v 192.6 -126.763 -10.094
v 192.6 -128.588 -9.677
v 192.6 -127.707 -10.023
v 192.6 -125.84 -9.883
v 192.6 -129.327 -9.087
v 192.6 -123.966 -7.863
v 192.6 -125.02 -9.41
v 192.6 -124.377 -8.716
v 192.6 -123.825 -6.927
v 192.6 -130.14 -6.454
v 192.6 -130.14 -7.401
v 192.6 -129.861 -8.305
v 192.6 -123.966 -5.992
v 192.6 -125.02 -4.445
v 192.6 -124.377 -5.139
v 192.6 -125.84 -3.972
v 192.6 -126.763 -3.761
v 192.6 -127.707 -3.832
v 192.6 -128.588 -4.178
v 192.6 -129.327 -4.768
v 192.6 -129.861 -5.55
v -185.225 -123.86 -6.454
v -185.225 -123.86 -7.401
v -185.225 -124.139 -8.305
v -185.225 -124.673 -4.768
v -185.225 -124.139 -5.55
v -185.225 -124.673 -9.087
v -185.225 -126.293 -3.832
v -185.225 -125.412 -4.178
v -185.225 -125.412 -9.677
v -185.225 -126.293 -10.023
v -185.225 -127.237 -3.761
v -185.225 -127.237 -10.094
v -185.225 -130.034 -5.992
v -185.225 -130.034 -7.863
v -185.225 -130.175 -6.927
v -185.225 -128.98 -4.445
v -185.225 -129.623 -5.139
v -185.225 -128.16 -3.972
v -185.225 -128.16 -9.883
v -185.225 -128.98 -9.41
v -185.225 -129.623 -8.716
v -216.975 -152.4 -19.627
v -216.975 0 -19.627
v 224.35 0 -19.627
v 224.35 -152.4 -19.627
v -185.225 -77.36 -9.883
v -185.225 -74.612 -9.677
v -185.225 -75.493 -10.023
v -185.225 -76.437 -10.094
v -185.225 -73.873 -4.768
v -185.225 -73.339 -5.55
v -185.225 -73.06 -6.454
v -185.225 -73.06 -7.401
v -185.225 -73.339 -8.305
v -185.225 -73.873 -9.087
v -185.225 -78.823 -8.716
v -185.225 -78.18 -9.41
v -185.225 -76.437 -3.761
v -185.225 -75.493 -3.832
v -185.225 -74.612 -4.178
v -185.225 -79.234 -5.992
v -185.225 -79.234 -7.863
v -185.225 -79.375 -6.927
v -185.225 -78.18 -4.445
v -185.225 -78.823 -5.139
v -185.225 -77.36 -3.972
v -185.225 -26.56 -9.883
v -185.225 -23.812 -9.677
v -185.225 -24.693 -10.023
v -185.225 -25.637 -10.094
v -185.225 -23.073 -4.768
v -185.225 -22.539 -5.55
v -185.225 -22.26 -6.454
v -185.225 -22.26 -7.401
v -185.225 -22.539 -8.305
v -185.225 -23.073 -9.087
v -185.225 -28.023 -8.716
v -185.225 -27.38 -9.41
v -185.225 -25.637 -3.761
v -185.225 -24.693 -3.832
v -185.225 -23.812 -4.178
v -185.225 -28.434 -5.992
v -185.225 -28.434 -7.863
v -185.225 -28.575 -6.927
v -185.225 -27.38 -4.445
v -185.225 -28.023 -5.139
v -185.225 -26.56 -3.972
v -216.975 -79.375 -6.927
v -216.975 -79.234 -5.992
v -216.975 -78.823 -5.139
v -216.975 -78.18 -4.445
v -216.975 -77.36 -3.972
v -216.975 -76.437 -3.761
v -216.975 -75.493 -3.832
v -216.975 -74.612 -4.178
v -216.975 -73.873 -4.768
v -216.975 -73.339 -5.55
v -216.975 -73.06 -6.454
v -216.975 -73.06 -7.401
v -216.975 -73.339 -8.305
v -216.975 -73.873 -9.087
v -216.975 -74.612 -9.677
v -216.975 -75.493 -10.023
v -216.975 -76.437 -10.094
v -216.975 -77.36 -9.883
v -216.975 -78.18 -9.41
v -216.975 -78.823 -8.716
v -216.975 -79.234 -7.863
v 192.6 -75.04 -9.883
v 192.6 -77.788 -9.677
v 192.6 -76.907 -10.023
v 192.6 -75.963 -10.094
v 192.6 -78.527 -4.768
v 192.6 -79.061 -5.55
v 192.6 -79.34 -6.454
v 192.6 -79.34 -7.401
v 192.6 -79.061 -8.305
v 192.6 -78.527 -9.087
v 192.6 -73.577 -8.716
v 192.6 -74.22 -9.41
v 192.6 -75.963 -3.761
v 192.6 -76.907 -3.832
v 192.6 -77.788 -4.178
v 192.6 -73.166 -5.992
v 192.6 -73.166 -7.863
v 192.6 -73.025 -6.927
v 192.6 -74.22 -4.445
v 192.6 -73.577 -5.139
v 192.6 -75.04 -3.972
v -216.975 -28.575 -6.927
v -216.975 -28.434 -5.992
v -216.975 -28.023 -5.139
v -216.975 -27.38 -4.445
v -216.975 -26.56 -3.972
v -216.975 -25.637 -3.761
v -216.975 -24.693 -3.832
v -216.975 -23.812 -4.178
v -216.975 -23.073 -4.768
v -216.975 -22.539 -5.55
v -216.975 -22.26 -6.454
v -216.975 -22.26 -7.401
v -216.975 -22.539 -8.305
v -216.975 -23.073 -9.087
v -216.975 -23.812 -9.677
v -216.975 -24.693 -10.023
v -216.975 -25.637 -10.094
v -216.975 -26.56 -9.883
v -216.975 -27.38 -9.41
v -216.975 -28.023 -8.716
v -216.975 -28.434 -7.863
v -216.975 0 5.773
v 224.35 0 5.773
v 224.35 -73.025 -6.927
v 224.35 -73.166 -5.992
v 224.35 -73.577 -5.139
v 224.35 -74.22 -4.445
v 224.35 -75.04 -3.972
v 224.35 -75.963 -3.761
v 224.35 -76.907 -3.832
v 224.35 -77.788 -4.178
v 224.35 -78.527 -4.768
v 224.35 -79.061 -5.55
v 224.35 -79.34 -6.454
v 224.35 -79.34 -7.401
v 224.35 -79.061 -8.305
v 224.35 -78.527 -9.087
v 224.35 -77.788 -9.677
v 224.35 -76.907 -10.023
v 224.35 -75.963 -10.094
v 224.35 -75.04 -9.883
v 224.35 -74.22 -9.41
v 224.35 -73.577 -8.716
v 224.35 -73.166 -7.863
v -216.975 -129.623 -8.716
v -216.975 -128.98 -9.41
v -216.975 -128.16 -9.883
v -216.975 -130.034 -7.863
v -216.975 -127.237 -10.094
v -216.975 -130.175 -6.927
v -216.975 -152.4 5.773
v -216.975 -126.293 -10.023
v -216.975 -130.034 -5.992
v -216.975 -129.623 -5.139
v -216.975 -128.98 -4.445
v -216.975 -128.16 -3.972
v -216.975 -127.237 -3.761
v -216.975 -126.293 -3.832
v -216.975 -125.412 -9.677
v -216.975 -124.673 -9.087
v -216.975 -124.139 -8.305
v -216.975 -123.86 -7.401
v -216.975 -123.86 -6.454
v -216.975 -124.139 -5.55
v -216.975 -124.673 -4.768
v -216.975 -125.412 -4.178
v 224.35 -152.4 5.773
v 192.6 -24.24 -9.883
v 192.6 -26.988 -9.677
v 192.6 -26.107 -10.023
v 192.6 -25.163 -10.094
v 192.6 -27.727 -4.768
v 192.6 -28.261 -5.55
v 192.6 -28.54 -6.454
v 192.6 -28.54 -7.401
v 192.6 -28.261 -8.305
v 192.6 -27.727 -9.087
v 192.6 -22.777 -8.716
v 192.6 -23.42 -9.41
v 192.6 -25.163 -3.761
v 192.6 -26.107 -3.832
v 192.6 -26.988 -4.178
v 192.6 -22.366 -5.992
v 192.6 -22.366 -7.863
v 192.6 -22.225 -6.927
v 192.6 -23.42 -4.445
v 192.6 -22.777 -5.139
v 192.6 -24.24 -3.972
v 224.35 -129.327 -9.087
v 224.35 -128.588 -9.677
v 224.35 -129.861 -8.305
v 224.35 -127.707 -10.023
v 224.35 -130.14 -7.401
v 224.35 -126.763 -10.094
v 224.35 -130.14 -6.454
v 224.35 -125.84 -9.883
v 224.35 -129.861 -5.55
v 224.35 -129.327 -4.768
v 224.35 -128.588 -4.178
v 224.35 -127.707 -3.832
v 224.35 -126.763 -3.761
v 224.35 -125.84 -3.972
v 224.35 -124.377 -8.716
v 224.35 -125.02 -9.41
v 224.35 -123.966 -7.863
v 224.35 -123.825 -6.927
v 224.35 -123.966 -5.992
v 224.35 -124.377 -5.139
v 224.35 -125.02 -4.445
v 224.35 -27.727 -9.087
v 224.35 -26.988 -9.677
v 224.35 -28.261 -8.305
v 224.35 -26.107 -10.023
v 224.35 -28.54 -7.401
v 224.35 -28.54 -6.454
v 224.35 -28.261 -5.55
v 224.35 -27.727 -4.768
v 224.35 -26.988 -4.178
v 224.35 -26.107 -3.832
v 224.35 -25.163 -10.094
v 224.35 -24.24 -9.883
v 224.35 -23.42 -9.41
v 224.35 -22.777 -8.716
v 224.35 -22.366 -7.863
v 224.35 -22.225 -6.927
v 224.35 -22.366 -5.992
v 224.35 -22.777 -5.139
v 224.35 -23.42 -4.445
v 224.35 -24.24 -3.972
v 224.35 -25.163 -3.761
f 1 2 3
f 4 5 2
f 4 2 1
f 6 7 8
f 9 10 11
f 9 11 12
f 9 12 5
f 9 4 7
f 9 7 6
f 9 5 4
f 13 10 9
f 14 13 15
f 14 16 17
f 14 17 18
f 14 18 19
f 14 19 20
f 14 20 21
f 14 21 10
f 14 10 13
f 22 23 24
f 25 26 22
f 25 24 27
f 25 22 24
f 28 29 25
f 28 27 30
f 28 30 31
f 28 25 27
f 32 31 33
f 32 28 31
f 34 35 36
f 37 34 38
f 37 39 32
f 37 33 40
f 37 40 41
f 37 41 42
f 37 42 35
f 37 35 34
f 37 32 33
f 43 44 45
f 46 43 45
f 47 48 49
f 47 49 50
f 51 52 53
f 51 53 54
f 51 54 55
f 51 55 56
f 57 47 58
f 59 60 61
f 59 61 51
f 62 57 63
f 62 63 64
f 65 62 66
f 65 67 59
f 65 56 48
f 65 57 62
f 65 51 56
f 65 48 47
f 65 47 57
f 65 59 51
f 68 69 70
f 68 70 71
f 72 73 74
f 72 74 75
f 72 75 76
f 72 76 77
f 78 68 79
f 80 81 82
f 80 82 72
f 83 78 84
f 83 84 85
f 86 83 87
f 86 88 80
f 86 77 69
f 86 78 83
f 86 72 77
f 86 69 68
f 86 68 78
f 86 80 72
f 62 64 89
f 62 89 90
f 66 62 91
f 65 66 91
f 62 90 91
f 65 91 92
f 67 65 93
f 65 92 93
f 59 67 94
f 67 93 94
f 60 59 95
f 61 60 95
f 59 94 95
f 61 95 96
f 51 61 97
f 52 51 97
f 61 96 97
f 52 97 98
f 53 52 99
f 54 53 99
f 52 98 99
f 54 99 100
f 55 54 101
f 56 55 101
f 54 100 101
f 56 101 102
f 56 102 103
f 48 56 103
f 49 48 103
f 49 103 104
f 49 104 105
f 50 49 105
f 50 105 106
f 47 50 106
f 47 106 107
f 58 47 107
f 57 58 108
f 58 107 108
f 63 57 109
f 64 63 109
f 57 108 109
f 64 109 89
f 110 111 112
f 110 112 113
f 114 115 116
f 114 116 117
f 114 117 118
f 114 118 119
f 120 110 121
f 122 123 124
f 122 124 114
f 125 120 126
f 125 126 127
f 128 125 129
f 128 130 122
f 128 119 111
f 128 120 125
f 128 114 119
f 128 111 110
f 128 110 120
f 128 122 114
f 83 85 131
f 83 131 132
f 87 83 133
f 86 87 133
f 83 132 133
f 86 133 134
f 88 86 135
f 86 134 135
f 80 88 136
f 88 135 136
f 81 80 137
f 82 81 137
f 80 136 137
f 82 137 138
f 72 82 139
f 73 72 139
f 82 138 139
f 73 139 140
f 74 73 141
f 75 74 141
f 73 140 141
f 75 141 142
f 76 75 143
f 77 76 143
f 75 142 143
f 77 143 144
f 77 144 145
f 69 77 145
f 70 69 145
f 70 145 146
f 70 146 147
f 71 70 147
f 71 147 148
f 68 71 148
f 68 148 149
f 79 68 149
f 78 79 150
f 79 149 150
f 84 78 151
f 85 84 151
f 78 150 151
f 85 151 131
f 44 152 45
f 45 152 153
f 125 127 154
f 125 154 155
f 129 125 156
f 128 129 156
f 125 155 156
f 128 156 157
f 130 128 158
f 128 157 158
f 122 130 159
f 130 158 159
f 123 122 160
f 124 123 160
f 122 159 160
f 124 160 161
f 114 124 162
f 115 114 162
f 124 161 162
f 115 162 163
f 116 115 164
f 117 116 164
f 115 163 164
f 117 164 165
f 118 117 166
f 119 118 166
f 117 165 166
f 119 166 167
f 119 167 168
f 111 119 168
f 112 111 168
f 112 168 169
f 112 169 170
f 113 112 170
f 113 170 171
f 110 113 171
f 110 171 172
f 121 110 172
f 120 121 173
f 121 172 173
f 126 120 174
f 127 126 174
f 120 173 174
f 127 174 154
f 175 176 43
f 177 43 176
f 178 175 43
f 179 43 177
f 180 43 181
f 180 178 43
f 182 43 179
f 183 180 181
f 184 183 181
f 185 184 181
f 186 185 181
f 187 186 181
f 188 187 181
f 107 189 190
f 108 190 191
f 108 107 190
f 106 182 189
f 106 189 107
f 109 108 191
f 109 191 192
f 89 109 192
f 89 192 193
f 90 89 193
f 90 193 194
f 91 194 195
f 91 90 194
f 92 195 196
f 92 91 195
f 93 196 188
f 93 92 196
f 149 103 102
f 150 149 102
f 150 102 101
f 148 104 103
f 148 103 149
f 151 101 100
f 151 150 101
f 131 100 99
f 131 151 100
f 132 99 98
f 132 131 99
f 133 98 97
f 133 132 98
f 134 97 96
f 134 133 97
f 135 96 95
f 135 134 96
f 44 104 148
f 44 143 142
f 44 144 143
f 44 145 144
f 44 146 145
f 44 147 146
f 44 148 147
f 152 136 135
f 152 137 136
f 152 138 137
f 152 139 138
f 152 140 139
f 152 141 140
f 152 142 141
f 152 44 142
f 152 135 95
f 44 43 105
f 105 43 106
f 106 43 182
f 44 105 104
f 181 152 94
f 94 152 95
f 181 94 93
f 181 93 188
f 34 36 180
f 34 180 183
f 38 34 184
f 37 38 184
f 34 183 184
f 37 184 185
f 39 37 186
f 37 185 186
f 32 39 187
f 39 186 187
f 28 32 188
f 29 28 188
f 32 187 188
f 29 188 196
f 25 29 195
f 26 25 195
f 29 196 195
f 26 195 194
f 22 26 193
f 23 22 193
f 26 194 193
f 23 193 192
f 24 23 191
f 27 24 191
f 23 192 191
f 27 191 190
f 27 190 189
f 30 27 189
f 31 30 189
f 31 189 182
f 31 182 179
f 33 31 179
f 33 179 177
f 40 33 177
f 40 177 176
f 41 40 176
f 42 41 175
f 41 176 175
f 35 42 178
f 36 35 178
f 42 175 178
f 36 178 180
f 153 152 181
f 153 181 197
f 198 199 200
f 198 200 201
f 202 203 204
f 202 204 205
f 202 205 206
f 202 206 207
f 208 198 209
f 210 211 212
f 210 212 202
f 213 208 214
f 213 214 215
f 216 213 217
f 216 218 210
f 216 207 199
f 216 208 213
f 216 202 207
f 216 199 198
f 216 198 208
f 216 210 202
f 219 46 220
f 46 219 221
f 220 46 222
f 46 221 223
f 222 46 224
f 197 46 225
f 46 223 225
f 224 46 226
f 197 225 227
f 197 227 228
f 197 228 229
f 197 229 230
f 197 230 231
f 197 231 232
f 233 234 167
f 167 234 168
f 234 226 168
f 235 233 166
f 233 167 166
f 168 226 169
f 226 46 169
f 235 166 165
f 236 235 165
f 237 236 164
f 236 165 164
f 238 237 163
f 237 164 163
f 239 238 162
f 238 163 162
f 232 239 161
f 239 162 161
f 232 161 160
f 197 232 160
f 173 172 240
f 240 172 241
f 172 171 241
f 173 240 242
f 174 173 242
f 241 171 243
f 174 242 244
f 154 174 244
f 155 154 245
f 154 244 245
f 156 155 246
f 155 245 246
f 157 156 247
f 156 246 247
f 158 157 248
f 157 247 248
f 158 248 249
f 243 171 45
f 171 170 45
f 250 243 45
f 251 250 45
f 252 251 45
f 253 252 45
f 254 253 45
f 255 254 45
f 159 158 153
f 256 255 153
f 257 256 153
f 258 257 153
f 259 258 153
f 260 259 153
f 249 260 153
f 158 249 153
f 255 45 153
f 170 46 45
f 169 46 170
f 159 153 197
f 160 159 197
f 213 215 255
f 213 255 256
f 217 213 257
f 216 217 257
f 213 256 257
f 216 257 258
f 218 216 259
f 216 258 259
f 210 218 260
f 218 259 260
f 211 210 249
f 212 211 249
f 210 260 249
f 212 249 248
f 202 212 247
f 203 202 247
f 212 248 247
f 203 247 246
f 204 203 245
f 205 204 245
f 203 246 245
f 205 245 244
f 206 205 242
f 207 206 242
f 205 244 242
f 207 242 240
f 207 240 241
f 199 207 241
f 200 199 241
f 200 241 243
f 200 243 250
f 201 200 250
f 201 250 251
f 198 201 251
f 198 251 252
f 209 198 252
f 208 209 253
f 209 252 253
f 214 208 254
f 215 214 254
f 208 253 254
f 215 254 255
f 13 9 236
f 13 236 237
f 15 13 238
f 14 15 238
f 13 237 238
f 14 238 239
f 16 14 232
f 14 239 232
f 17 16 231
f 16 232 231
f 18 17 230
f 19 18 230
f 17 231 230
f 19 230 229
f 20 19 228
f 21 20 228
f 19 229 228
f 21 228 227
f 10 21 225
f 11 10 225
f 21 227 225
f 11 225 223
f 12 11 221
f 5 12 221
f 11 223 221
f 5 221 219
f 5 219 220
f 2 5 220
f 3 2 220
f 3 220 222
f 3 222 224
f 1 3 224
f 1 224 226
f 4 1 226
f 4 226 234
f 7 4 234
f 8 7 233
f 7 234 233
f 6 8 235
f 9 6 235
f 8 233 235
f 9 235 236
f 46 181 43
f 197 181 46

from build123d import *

# Parameters (mm, degrees)
F0_W     = 441.325
F0_H     = 25.4
F1_DEPTH = 152.4
F2_R     = 3.175
F4_DEPTH = 31.75
F3_R     = 3.175
F5_DEPTH = 31.75


with BuildPart() as f1:
    # F0 (on Front) → F1 (new body)
    with BuildSketch(Plane.XZ):
        with Locations((3.6871, -6.927435)):
            Rectangle(F0_W, F0_H)
    extrude(amount=F1_DEPTH)

    # F2 (on face) → F4 (cut)
    with BuildSketch(Plane(origin=(-216.9754, 0, 0), x_dir=(0, -1, 0), z_dir=(-1, 0, 0))):
        with Locations((25.4, -6.927435)):
            Circle(F2_R)
        with Locations((76.2, -6.927435)):
            Circle(F2_R)
        with Locations((127, -6.927435)):
            Circle(F2_R)
    extrude(amount=-F4_DEPTH, mode=Mode.SUBTRACT)

    # F3 (on face) → F5 (cut)
    with BuildSketch(Plane.YZ.offset(224.3496)):
        with Locations((-25.4, -6.927435)):
            Circle(F3_R)
        with Locations((-76.2, -6.927435)):
            Circle(F3_R)
        with Locations((-127, -6.927435)):
            Circle(F3_R)
    extrude(amount=-F5_DEPTH, mode=Mode.SUBTRACT)


solid = f1.part
